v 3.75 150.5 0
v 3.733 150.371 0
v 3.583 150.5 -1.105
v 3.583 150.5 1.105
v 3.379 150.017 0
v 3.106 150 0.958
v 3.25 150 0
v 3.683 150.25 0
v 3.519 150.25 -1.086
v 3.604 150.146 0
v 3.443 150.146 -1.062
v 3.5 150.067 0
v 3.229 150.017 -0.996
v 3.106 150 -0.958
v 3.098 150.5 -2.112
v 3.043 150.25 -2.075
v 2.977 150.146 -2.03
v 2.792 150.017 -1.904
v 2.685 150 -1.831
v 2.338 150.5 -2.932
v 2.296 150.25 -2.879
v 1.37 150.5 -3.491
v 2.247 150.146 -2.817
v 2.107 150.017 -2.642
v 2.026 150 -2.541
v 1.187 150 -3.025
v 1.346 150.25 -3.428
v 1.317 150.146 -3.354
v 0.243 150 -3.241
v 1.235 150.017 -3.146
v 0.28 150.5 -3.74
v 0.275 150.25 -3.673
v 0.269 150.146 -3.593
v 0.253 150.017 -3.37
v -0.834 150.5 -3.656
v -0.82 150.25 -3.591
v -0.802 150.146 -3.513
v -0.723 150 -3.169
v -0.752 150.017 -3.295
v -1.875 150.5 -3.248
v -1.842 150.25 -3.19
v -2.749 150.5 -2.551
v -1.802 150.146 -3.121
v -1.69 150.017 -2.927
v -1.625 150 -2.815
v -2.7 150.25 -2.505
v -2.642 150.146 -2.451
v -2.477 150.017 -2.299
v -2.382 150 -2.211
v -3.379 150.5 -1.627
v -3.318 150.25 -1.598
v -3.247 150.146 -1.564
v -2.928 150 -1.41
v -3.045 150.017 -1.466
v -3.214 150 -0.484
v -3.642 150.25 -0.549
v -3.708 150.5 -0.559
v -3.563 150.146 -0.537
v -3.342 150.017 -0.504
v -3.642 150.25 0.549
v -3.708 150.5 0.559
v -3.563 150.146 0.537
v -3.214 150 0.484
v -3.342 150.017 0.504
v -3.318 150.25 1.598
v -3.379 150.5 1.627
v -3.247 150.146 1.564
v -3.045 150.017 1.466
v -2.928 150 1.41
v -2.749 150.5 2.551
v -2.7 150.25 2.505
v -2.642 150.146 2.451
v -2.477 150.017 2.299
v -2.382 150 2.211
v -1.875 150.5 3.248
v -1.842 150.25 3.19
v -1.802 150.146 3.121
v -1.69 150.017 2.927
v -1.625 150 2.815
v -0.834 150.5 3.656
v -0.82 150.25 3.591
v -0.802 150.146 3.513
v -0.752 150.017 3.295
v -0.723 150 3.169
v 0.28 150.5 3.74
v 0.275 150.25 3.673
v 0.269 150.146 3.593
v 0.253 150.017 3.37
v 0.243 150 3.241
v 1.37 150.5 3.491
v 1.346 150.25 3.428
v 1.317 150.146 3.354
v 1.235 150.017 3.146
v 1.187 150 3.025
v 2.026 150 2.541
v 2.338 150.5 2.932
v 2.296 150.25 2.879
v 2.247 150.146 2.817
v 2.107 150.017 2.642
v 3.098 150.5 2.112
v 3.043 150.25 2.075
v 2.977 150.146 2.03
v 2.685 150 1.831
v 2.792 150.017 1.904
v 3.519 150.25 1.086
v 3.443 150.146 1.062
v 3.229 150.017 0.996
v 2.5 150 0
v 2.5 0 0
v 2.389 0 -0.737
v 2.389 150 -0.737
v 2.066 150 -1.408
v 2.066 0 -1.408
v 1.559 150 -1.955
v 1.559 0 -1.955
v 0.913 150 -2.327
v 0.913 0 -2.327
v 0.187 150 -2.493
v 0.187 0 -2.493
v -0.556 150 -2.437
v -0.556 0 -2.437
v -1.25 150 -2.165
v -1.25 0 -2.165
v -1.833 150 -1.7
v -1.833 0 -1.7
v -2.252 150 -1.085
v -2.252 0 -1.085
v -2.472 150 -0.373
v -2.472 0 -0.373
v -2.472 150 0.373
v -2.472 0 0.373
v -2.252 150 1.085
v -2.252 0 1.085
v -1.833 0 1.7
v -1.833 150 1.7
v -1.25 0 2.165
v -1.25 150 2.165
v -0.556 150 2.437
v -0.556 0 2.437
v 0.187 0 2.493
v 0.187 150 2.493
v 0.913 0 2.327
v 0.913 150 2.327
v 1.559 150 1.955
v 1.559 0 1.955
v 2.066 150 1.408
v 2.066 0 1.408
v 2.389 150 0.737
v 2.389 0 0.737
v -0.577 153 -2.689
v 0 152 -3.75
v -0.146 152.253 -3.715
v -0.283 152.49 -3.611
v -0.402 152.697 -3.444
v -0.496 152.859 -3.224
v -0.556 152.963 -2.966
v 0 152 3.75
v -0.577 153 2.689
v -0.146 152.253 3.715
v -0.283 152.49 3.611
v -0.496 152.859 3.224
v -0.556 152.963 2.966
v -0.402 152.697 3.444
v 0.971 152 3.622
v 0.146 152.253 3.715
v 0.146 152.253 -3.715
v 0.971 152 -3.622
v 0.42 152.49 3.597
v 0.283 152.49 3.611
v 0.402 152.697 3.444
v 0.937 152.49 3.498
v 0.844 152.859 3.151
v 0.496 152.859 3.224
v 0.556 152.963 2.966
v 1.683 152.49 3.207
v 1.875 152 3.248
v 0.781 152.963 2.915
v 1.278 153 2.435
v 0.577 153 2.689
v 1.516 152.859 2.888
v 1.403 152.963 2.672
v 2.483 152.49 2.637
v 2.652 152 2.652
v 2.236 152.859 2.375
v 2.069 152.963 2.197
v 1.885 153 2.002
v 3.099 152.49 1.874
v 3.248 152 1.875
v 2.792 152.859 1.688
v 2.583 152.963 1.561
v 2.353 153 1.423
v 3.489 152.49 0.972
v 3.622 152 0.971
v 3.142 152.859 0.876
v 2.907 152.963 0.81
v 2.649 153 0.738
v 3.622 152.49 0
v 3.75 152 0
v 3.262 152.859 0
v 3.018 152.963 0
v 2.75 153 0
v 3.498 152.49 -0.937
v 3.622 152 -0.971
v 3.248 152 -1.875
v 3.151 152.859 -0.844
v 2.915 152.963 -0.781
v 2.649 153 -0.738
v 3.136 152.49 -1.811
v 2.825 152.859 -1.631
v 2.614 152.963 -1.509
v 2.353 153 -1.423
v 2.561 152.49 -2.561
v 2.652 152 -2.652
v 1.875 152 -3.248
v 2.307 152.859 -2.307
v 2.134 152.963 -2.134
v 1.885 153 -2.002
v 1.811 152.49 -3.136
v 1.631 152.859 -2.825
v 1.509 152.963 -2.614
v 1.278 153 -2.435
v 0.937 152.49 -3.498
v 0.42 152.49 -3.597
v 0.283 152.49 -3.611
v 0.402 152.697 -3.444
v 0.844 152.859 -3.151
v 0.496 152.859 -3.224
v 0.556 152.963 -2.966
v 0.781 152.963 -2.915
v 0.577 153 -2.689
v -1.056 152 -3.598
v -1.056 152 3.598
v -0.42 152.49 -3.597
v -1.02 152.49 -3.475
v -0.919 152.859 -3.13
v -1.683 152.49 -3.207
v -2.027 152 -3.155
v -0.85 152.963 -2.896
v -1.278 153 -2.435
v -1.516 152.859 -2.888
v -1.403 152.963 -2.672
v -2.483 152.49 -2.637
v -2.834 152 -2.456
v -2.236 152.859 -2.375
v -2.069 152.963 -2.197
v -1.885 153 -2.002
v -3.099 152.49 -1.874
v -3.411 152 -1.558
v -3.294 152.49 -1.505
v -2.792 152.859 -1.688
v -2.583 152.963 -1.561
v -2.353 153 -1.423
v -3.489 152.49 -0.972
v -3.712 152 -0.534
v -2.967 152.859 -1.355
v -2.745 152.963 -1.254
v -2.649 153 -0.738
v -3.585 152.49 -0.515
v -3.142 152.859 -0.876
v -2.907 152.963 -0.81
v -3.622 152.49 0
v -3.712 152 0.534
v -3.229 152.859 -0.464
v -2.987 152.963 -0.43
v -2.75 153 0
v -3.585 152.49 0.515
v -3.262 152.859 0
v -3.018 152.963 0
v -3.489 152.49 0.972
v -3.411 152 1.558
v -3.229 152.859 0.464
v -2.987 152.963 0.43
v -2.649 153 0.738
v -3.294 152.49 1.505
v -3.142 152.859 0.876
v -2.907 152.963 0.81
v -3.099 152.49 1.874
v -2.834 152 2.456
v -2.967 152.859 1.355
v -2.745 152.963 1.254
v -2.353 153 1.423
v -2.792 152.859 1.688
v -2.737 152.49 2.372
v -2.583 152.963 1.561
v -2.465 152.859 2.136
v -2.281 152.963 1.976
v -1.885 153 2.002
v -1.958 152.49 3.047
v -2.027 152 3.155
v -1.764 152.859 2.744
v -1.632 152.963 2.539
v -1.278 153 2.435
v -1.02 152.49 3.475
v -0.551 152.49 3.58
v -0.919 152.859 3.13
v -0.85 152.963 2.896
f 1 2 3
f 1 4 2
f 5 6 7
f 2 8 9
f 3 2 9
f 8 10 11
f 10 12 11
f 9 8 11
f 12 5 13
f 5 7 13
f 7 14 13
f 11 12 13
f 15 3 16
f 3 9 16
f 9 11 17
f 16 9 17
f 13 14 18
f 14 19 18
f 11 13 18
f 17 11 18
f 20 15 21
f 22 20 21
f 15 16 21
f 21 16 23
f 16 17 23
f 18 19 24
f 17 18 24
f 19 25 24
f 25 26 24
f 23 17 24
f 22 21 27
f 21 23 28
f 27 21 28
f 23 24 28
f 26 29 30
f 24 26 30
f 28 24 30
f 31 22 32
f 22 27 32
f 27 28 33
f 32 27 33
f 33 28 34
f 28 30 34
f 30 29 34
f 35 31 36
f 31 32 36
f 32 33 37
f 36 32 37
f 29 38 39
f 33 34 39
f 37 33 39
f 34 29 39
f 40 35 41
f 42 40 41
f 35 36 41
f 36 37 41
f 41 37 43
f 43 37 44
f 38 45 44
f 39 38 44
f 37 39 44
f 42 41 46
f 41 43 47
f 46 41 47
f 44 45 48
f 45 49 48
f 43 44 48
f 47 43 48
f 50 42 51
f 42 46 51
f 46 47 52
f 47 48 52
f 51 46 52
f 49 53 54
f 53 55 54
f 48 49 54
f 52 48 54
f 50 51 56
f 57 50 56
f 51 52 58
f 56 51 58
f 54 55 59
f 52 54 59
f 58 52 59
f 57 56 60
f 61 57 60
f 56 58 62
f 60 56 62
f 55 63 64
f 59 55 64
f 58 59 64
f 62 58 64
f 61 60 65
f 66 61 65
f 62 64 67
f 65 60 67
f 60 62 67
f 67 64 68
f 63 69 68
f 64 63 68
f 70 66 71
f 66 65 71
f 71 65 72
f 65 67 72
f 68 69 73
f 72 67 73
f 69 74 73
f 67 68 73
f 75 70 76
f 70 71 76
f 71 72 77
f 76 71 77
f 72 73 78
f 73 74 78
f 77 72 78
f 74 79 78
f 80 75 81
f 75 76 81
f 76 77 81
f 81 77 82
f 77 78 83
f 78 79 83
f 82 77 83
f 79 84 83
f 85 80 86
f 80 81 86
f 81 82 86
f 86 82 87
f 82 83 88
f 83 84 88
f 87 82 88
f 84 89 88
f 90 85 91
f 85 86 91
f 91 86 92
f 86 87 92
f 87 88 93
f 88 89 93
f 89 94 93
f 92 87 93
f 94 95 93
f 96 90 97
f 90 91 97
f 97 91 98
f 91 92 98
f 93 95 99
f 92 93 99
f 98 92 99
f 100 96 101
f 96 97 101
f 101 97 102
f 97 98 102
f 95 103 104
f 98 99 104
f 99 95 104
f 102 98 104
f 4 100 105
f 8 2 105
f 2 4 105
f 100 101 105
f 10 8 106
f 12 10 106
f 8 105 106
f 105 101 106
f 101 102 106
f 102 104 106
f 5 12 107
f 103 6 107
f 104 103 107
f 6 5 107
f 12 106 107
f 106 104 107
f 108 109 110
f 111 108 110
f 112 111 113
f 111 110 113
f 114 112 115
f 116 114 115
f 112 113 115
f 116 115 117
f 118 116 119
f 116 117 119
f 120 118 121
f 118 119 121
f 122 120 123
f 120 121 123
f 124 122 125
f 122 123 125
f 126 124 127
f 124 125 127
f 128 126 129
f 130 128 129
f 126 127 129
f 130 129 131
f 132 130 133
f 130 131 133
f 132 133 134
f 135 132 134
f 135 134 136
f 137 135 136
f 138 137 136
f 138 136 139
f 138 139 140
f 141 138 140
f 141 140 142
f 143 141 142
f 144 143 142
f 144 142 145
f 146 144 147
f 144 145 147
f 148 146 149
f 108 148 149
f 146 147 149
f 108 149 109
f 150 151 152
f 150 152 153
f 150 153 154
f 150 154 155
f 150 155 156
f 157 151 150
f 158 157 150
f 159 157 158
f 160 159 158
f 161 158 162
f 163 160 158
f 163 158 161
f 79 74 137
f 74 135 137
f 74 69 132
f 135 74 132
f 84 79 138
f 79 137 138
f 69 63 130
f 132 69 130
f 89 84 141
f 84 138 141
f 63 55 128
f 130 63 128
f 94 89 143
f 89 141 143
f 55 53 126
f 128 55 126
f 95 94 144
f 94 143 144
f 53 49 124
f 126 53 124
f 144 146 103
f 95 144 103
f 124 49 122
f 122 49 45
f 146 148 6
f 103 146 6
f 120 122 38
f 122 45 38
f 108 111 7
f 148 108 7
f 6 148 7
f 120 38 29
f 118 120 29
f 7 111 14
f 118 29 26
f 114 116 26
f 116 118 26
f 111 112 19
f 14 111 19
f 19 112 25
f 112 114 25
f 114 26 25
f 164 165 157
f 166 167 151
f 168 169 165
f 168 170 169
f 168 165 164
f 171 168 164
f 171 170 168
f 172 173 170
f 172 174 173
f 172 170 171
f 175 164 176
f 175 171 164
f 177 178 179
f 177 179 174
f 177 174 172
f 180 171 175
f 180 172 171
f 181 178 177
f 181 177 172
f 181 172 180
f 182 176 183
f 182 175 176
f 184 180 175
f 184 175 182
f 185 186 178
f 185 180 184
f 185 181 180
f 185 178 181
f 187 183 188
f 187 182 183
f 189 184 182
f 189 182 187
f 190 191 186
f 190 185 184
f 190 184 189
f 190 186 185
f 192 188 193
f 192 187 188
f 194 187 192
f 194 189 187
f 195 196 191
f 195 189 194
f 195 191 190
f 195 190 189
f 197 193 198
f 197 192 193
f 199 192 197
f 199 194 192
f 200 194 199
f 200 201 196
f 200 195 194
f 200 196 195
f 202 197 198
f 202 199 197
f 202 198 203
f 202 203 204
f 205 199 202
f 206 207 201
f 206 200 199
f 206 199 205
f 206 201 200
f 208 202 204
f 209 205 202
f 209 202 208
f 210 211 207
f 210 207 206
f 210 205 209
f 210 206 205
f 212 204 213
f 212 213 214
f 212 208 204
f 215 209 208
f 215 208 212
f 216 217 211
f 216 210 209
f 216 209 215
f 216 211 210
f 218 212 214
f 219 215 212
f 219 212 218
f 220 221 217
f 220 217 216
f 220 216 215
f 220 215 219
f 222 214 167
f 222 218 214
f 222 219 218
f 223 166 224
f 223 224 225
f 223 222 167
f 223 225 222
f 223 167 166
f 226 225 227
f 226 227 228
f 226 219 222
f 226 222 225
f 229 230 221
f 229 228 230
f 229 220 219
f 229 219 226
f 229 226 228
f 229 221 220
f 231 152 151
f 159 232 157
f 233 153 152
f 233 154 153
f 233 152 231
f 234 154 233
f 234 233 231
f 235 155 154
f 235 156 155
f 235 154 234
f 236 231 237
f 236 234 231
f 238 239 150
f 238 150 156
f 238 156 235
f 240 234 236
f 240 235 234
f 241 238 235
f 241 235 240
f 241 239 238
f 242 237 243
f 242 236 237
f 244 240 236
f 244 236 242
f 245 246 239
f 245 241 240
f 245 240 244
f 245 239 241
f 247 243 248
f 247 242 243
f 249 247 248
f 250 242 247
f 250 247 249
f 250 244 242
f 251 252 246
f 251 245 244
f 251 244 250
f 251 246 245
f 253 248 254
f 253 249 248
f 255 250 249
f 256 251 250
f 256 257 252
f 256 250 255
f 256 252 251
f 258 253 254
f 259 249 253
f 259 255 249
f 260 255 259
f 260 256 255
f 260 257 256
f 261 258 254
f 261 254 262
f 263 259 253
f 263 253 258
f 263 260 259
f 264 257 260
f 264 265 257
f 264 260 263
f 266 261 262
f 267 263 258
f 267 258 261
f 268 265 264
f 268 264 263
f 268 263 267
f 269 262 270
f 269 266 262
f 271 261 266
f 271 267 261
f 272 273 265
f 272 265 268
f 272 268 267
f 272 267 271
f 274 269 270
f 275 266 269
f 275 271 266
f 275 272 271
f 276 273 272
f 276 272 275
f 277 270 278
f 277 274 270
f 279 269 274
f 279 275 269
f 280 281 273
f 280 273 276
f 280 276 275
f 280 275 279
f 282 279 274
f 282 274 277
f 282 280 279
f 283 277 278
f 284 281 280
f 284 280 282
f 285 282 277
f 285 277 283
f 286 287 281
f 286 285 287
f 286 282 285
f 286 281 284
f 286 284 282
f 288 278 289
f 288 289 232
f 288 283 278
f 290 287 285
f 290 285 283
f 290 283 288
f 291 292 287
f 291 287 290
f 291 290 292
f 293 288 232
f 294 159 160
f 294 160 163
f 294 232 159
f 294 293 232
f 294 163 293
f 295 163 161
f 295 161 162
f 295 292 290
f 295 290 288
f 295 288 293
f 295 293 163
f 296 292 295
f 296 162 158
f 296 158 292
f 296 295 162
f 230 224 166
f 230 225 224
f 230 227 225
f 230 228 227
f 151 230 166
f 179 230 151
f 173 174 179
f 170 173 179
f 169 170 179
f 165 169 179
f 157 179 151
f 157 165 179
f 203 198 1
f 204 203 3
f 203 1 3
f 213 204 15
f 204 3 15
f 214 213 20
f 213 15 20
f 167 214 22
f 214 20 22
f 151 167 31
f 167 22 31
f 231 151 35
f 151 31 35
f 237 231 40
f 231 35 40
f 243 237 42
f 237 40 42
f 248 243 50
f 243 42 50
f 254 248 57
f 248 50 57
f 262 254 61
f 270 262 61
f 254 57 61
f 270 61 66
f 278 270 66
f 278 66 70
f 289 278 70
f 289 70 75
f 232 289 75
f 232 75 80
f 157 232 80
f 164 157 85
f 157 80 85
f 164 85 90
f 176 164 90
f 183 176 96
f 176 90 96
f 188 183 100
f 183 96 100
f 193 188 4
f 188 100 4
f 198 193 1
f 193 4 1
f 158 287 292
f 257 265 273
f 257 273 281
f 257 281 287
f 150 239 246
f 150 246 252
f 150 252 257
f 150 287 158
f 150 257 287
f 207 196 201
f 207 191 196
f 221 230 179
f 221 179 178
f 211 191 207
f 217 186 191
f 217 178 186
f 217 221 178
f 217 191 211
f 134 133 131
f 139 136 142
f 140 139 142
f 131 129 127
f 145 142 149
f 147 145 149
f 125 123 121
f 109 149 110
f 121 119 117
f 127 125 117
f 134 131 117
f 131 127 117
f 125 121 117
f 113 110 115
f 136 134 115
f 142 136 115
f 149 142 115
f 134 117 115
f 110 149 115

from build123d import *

# Parameters (mm, degrees)
SKETCH1_R               = 2.5
BOSS_EXTRUDE1_DEPTH     = 150
SKETCH2_R               = 3.75
BOSS_EXTRUDE2_DEPTH     = 3
FILLET1_R               = 1
CUT_EXTRUDE1_DEPTH      = 10
CUT_EXTRUDE1_DEPTH_BACK = 10
FILLET2_R               = 0.5


with BuildPart() as part:
    # Sketch1 → Boss-Extrude1 (new body)
    with BuildSketch(Plane(origin=(0, 0, 0), x_dir=(1, 0, 0), z_dir=(0, 1, 0))):
        Circle(SKETCH1_R)
    extrude(amount=BOSS_EXTRUDE1_DEPTH)

    # Sketch2 → Boss-Extrude2 (add)
    with BuildSketch(Plane(origin=(0, 150, 0), x_dir=(1, 0, 0), z_dir=(0, 1, 0))):
        Circle(SKETCH2_R)
    extrude(amount=BOSS_EXTRUDE2_DEPTH)

    # Fillet1
    fillet1_edges = [part.edges().sort_by_distance(p)[0] for p in [
        (-3.75, 153, 0),
    ]]
    fillet(fillet1_edges, radius=FILLET1_R)

    # Sketch4 → Cut-Extrude1 (cut, two sides: drawn at the far end of the back side and taken through both)
    with BuildSketch(Plane.XY.offset(-CUT_EXTRUDE1_DEPTH_BACK)):
        Polygon((0, 152), (-0.577350269, 153), (0.577350269, 153), align=None)
    extrude(amount=CUT_EXTRUDE1_DEPTH + CUT_EXTRUDE1_DEPTH_BACK, mode=Mode.SUBTRACT)

    # Fillet2
    fillet2_edges = [part.edges().sort_by_distance(p)[0] for p in [
        (-3.75, 150, 0),
    ]]
    fillet(fillet2_edges, radius=FILLET2_R)


solid = part.part
